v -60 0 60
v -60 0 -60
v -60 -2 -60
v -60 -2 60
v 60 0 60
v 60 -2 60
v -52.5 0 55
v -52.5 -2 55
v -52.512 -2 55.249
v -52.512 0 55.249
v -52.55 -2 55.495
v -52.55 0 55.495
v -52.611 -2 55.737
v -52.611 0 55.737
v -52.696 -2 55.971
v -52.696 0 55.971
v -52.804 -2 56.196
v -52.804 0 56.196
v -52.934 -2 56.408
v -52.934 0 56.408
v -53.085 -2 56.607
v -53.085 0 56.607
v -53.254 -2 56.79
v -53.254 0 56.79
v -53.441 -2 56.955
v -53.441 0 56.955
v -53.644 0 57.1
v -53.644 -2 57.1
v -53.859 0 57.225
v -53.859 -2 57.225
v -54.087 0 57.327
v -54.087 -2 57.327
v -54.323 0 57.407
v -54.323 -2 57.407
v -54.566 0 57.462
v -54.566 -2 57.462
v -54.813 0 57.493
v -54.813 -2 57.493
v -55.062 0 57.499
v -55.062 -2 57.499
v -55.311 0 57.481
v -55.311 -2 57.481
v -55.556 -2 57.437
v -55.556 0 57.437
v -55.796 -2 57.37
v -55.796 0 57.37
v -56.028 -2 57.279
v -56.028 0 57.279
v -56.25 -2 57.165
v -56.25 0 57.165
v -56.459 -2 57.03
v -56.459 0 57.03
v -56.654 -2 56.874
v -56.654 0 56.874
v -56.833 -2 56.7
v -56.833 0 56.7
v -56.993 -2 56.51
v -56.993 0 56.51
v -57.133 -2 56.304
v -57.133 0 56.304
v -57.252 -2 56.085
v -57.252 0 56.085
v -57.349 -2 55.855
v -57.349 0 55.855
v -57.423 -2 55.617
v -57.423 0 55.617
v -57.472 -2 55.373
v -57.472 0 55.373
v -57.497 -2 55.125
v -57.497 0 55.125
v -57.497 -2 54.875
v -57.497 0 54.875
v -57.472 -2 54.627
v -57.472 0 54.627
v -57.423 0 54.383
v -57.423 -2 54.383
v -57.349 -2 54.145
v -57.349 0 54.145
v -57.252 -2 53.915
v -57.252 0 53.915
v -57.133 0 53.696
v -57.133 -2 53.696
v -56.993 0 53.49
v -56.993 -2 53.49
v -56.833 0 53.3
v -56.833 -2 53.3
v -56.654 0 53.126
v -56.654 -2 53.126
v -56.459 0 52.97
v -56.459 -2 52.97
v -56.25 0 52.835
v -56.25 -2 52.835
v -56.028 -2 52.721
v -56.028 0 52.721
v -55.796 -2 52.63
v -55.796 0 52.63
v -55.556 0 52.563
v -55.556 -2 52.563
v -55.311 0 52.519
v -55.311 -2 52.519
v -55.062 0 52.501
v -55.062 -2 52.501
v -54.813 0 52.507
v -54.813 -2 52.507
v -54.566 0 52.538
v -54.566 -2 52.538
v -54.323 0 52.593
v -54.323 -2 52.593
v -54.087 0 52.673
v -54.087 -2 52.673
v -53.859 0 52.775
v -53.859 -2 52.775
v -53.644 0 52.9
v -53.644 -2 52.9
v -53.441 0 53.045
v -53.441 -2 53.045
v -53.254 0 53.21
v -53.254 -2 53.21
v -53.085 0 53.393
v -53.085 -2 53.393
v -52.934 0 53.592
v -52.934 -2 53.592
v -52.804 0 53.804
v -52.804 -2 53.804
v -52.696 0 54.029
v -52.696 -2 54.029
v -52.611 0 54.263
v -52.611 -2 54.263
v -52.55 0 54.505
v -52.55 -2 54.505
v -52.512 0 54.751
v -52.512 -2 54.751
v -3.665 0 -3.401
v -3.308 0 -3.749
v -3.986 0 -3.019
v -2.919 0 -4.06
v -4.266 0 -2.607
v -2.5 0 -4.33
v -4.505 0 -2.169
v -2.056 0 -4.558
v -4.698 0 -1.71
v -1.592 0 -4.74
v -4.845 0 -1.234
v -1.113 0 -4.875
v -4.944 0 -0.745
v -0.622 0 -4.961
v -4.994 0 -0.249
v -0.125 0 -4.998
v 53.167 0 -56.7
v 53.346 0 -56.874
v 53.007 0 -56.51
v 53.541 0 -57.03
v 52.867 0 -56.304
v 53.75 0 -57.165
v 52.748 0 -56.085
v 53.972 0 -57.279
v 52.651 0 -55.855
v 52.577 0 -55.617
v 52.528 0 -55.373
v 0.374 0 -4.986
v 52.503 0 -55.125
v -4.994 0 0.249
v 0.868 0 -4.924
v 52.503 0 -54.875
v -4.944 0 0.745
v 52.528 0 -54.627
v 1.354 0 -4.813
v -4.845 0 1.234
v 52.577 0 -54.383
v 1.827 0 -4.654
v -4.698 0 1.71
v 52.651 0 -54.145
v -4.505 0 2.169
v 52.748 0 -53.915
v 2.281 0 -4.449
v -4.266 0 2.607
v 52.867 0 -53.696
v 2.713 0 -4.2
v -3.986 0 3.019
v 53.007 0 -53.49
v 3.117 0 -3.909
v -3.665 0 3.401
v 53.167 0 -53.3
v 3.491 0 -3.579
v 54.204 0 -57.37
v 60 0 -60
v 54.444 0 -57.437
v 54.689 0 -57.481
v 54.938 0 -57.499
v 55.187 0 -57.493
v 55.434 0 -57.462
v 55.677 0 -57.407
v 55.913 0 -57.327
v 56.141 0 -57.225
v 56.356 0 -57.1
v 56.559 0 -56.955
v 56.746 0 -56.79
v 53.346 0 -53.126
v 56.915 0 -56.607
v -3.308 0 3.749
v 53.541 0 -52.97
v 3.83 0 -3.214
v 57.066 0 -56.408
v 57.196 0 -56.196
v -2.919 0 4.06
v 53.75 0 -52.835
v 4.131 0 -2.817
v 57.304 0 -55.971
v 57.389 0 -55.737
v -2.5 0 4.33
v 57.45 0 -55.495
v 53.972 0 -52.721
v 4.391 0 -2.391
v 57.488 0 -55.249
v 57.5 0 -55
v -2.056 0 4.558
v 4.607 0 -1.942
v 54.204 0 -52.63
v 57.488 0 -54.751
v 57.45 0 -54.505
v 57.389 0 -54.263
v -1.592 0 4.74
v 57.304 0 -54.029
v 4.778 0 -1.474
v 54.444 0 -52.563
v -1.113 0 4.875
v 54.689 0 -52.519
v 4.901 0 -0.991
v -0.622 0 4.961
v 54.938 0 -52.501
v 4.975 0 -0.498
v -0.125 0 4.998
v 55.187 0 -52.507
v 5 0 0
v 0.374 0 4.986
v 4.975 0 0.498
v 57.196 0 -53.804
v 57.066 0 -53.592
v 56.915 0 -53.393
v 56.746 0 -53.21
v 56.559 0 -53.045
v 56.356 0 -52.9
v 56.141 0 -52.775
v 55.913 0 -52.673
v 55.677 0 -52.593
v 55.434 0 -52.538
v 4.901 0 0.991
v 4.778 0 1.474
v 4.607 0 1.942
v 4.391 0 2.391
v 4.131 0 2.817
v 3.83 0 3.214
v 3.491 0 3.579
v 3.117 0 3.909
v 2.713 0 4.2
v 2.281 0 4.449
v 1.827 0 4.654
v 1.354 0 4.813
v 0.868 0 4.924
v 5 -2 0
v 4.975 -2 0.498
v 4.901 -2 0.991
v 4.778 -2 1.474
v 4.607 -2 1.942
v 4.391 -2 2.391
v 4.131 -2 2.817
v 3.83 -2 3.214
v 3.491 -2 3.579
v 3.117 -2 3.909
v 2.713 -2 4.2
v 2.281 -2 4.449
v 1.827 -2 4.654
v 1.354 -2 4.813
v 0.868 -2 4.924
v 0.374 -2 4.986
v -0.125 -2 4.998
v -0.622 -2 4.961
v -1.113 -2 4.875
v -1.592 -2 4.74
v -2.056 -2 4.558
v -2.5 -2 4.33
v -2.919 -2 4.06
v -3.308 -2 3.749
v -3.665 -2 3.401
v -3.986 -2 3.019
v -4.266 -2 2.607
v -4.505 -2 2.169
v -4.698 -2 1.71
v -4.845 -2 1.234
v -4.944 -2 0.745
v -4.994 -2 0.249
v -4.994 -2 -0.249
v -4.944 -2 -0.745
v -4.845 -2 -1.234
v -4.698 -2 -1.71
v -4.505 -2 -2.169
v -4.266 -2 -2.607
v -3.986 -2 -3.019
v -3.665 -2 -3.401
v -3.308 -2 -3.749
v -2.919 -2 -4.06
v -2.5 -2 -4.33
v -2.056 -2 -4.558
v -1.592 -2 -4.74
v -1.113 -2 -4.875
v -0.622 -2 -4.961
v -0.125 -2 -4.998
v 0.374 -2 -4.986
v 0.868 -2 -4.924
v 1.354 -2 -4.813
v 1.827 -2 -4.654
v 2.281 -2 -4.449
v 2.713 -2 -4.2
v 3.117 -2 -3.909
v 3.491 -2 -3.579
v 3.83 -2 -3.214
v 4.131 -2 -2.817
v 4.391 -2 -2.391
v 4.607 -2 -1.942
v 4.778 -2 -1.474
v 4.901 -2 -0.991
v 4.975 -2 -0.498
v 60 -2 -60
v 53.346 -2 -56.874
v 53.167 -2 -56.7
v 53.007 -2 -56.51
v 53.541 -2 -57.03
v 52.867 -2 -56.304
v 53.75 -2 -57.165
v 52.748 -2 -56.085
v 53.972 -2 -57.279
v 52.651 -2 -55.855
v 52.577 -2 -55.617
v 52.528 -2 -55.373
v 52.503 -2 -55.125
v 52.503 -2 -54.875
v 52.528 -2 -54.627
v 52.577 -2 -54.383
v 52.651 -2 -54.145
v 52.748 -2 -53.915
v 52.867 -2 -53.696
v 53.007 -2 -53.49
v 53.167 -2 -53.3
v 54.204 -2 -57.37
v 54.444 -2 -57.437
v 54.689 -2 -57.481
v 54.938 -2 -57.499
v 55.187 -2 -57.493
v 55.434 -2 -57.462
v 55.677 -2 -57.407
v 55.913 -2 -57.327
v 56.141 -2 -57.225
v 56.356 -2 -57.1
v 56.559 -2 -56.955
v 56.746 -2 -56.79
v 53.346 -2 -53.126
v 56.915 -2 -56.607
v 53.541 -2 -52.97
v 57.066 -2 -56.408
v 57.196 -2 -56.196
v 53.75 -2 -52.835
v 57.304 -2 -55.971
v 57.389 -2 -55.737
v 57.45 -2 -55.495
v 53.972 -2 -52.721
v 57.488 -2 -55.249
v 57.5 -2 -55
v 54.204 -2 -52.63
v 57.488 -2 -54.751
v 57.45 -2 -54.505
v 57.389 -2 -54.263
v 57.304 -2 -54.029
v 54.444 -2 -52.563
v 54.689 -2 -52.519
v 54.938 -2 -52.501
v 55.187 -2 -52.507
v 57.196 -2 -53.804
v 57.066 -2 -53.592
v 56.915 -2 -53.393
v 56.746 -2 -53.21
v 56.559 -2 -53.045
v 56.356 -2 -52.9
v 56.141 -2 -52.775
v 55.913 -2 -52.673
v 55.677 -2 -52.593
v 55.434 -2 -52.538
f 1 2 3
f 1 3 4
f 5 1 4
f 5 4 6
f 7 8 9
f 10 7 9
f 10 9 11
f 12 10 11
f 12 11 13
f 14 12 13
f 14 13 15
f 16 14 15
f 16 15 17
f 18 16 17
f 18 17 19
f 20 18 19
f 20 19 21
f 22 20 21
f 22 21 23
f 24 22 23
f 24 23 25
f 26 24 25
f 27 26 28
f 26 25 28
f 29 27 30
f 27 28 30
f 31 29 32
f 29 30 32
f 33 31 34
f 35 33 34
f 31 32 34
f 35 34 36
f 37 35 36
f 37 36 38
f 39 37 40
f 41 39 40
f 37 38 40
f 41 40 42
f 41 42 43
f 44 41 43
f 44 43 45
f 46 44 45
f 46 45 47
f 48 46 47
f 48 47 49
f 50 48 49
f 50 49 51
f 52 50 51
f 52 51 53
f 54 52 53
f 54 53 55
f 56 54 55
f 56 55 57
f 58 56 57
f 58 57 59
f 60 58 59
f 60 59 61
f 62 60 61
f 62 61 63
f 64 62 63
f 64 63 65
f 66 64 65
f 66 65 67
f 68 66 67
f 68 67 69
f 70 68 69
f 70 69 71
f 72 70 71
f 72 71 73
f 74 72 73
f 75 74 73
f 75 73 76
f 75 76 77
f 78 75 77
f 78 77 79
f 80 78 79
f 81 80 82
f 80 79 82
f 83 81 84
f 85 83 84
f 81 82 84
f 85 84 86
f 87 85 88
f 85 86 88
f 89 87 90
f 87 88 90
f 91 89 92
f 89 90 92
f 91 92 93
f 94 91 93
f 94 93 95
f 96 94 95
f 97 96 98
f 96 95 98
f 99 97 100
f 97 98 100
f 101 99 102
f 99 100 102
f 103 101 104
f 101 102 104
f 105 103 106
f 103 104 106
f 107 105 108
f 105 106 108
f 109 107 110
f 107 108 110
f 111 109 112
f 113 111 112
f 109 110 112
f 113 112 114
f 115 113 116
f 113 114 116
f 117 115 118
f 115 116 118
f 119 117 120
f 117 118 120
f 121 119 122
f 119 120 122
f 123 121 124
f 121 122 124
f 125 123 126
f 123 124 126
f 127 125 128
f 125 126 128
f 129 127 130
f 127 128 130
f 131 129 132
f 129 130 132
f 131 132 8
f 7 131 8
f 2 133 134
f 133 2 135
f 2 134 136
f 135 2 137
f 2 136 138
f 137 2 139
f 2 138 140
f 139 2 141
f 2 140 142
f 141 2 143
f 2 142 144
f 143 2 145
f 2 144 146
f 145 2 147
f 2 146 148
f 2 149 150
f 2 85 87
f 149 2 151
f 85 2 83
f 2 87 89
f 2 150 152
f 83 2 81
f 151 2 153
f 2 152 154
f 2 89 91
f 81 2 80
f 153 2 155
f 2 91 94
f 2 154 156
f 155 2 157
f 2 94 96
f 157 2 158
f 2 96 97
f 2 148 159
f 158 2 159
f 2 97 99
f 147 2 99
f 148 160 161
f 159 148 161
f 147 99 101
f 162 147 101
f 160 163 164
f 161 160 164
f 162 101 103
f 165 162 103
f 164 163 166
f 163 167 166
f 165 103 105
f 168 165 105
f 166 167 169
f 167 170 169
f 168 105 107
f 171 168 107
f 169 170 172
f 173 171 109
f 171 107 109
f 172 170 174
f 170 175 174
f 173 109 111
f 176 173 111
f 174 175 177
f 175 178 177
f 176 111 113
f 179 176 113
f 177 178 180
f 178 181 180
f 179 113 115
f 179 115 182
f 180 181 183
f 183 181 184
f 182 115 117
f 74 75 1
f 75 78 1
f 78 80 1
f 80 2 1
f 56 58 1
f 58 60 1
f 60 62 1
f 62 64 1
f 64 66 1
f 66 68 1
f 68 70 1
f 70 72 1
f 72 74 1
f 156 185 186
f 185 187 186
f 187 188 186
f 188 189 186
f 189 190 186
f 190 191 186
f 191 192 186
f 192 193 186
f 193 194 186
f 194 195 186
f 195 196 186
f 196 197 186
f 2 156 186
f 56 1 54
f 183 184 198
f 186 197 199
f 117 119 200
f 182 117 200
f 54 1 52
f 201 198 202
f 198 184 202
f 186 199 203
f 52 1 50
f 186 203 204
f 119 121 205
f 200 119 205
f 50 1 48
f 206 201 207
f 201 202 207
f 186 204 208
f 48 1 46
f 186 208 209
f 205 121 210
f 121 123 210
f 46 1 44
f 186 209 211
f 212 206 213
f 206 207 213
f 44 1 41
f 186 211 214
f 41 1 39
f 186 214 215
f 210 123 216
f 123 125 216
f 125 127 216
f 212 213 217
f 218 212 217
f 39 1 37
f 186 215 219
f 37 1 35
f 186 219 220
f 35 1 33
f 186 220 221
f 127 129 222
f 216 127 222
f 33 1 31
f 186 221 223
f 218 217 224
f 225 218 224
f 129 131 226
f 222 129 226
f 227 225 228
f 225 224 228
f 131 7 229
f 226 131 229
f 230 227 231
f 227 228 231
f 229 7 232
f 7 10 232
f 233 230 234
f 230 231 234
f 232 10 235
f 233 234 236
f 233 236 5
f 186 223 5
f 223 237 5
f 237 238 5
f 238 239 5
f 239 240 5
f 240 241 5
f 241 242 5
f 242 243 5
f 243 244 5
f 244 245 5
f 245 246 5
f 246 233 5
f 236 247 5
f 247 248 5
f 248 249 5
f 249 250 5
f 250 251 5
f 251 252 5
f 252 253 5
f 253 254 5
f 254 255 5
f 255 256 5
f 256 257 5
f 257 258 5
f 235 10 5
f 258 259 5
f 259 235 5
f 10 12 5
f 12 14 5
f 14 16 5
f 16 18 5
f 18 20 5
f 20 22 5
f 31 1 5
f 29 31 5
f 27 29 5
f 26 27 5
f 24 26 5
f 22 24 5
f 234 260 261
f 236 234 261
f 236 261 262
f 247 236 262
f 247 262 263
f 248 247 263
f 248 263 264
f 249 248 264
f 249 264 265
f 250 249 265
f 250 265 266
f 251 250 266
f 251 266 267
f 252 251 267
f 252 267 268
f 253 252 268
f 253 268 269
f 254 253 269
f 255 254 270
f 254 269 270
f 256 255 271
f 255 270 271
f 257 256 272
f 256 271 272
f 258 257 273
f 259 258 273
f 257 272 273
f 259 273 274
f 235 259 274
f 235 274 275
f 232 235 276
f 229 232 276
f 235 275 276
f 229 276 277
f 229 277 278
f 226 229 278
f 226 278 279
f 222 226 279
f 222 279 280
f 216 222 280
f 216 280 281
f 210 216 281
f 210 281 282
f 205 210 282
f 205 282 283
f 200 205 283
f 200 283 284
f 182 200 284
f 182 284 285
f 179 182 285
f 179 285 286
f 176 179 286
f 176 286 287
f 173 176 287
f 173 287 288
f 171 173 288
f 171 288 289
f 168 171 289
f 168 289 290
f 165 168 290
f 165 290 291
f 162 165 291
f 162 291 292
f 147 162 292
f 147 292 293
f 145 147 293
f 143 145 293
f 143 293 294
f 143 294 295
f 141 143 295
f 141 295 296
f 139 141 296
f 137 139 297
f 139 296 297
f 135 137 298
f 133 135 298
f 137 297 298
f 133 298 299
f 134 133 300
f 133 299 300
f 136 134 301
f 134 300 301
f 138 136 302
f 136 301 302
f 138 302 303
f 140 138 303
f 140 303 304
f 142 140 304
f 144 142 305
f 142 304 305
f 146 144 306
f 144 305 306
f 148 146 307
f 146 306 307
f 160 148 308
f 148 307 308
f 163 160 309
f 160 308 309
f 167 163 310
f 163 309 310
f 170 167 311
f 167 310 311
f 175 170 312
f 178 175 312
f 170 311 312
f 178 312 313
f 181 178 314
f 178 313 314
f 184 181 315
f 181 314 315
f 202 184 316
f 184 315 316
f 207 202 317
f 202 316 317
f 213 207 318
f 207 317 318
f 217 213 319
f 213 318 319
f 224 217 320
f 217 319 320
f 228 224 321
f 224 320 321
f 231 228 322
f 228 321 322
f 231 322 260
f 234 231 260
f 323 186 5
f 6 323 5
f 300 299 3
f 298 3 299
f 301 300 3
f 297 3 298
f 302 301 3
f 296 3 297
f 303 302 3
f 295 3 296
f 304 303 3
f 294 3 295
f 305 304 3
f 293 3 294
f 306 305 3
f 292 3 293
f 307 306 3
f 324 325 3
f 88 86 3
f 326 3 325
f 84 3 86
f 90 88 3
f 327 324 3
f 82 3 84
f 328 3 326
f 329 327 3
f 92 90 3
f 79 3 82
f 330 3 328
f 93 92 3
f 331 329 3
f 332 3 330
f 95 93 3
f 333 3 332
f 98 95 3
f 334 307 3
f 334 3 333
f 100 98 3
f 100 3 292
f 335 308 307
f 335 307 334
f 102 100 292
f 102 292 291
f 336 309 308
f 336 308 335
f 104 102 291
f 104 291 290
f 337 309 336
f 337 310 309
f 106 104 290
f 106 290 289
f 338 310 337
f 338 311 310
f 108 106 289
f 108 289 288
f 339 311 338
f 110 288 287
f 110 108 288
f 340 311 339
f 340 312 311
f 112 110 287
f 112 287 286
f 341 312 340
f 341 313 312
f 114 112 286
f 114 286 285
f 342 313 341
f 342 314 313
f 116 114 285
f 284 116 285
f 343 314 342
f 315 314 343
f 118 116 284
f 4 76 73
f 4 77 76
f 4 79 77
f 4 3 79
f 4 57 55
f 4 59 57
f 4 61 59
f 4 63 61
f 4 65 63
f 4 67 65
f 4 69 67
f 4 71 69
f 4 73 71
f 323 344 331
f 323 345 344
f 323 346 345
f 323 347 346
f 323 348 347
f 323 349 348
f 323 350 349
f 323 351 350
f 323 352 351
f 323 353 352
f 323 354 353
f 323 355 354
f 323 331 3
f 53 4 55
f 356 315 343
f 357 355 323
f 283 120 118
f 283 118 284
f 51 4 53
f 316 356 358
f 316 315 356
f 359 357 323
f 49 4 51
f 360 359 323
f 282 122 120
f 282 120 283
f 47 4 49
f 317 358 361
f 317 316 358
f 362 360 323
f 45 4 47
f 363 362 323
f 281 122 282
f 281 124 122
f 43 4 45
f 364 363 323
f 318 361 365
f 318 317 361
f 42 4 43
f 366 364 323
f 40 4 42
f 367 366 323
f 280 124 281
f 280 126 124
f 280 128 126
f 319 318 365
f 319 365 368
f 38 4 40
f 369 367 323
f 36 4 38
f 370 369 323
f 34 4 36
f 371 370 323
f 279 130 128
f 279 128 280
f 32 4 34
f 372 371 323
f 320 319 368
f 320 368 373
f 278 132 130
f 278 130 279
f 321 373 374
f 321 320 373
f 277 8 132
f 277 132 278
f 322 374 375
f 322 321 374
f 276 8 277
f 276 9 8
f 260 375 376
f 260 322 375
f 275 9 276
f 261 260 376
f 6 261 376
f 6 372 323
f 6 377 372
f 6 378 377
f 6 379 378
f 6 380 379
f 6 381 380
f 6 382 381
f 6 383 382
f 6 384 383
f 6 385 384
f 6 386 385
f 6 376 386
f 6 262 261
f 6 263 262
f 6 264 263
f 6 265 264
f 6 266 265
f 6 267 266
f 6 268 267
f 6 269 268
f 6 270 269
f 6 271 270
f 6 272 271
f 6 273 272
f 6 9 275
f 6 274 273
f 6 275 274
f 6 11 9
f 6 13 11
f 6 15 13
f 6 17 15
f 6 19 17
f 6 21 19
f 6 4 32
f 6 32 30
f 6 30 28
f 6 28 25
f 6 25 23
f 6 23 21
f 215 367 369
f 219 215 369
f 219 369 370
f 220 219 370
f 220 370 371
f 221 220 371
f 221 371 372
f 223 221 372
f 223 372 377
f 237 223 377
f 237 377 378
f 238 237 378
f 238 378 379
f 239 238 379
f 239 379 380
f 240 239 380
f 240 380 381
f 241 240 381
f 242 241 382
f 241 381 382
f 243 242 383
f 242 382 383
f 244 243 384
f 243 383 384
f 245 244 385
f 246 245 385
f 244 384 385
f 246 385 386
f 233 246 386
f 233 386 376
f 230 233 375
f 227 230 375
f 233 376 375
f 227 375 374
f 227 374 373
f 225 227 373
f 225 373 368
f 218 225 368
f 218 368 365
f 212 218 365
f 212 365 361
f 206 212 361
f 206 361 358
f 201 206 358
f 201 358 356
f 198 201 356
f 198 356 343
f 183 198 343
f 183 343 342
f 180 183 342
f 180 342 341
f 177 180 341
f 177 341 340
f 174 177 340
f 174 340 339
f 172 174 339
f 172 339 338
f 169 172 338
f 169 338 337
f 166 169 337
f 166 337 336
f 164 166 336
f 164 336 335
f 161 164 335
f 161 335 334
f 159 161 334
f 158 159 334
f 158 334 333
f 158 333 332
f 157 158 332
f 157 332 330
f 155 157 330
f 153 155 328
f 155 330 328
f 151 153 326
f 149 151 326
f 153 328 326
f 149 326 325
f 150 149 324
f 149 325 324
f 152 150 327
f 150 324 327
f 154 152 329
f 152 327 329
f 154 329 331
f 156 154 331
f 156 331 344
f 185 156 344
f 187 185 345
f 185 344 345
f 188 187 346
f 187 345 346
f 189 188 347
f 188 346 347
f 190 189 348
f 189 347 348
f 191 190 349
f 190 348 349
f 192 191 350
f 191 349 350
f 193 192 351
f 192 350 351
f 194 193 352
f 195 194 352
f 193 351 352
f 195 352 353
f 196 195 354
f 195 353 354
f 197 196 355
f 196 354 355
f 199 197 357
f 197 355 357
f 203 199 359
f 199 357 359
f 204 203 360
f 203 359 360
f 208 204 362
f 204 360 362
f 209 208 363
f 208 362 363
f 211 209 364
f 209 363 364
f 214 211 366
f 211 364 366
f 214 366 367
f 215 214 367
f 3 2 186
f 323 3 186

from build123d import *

# Parameters (mm, degrees)
F0_W     = 120
F0_H     = 120
F1_DEPTH = 2
F2_R     = 2.5
F3_DEPTH = 2.001
F4_R     = 5
F5_DEPTH = 2.001


with BuildPart() as f1:
    # F0 (on Front) → F1 (new body)
    with BuildSketch(Plane.XZ):
        Rectangle(F0_W, F0_H)
    extrude(amount=F1_DEPTH)

    # F2 (on face) → F3 (cut, through all)
    with BuildSketch(Plane.XZ.offset(2)):
        with Locations((-55, 55)):
            Circle(F2_R)
        with Locations((55, -55)):
            Circle(F2_R)
    extrude(amount=-F3_DEPTH, mode=Mode.SUBTRACT)

    # F4 (on face) → F5 (cut, through all)
    with BuildSketch(Plane.XZ.offset(2)):
        Circle(F4_R)
    extrude(amount=-F5_DEPTH, mode=Mode.SUBTRACT)


solid = f1.part
